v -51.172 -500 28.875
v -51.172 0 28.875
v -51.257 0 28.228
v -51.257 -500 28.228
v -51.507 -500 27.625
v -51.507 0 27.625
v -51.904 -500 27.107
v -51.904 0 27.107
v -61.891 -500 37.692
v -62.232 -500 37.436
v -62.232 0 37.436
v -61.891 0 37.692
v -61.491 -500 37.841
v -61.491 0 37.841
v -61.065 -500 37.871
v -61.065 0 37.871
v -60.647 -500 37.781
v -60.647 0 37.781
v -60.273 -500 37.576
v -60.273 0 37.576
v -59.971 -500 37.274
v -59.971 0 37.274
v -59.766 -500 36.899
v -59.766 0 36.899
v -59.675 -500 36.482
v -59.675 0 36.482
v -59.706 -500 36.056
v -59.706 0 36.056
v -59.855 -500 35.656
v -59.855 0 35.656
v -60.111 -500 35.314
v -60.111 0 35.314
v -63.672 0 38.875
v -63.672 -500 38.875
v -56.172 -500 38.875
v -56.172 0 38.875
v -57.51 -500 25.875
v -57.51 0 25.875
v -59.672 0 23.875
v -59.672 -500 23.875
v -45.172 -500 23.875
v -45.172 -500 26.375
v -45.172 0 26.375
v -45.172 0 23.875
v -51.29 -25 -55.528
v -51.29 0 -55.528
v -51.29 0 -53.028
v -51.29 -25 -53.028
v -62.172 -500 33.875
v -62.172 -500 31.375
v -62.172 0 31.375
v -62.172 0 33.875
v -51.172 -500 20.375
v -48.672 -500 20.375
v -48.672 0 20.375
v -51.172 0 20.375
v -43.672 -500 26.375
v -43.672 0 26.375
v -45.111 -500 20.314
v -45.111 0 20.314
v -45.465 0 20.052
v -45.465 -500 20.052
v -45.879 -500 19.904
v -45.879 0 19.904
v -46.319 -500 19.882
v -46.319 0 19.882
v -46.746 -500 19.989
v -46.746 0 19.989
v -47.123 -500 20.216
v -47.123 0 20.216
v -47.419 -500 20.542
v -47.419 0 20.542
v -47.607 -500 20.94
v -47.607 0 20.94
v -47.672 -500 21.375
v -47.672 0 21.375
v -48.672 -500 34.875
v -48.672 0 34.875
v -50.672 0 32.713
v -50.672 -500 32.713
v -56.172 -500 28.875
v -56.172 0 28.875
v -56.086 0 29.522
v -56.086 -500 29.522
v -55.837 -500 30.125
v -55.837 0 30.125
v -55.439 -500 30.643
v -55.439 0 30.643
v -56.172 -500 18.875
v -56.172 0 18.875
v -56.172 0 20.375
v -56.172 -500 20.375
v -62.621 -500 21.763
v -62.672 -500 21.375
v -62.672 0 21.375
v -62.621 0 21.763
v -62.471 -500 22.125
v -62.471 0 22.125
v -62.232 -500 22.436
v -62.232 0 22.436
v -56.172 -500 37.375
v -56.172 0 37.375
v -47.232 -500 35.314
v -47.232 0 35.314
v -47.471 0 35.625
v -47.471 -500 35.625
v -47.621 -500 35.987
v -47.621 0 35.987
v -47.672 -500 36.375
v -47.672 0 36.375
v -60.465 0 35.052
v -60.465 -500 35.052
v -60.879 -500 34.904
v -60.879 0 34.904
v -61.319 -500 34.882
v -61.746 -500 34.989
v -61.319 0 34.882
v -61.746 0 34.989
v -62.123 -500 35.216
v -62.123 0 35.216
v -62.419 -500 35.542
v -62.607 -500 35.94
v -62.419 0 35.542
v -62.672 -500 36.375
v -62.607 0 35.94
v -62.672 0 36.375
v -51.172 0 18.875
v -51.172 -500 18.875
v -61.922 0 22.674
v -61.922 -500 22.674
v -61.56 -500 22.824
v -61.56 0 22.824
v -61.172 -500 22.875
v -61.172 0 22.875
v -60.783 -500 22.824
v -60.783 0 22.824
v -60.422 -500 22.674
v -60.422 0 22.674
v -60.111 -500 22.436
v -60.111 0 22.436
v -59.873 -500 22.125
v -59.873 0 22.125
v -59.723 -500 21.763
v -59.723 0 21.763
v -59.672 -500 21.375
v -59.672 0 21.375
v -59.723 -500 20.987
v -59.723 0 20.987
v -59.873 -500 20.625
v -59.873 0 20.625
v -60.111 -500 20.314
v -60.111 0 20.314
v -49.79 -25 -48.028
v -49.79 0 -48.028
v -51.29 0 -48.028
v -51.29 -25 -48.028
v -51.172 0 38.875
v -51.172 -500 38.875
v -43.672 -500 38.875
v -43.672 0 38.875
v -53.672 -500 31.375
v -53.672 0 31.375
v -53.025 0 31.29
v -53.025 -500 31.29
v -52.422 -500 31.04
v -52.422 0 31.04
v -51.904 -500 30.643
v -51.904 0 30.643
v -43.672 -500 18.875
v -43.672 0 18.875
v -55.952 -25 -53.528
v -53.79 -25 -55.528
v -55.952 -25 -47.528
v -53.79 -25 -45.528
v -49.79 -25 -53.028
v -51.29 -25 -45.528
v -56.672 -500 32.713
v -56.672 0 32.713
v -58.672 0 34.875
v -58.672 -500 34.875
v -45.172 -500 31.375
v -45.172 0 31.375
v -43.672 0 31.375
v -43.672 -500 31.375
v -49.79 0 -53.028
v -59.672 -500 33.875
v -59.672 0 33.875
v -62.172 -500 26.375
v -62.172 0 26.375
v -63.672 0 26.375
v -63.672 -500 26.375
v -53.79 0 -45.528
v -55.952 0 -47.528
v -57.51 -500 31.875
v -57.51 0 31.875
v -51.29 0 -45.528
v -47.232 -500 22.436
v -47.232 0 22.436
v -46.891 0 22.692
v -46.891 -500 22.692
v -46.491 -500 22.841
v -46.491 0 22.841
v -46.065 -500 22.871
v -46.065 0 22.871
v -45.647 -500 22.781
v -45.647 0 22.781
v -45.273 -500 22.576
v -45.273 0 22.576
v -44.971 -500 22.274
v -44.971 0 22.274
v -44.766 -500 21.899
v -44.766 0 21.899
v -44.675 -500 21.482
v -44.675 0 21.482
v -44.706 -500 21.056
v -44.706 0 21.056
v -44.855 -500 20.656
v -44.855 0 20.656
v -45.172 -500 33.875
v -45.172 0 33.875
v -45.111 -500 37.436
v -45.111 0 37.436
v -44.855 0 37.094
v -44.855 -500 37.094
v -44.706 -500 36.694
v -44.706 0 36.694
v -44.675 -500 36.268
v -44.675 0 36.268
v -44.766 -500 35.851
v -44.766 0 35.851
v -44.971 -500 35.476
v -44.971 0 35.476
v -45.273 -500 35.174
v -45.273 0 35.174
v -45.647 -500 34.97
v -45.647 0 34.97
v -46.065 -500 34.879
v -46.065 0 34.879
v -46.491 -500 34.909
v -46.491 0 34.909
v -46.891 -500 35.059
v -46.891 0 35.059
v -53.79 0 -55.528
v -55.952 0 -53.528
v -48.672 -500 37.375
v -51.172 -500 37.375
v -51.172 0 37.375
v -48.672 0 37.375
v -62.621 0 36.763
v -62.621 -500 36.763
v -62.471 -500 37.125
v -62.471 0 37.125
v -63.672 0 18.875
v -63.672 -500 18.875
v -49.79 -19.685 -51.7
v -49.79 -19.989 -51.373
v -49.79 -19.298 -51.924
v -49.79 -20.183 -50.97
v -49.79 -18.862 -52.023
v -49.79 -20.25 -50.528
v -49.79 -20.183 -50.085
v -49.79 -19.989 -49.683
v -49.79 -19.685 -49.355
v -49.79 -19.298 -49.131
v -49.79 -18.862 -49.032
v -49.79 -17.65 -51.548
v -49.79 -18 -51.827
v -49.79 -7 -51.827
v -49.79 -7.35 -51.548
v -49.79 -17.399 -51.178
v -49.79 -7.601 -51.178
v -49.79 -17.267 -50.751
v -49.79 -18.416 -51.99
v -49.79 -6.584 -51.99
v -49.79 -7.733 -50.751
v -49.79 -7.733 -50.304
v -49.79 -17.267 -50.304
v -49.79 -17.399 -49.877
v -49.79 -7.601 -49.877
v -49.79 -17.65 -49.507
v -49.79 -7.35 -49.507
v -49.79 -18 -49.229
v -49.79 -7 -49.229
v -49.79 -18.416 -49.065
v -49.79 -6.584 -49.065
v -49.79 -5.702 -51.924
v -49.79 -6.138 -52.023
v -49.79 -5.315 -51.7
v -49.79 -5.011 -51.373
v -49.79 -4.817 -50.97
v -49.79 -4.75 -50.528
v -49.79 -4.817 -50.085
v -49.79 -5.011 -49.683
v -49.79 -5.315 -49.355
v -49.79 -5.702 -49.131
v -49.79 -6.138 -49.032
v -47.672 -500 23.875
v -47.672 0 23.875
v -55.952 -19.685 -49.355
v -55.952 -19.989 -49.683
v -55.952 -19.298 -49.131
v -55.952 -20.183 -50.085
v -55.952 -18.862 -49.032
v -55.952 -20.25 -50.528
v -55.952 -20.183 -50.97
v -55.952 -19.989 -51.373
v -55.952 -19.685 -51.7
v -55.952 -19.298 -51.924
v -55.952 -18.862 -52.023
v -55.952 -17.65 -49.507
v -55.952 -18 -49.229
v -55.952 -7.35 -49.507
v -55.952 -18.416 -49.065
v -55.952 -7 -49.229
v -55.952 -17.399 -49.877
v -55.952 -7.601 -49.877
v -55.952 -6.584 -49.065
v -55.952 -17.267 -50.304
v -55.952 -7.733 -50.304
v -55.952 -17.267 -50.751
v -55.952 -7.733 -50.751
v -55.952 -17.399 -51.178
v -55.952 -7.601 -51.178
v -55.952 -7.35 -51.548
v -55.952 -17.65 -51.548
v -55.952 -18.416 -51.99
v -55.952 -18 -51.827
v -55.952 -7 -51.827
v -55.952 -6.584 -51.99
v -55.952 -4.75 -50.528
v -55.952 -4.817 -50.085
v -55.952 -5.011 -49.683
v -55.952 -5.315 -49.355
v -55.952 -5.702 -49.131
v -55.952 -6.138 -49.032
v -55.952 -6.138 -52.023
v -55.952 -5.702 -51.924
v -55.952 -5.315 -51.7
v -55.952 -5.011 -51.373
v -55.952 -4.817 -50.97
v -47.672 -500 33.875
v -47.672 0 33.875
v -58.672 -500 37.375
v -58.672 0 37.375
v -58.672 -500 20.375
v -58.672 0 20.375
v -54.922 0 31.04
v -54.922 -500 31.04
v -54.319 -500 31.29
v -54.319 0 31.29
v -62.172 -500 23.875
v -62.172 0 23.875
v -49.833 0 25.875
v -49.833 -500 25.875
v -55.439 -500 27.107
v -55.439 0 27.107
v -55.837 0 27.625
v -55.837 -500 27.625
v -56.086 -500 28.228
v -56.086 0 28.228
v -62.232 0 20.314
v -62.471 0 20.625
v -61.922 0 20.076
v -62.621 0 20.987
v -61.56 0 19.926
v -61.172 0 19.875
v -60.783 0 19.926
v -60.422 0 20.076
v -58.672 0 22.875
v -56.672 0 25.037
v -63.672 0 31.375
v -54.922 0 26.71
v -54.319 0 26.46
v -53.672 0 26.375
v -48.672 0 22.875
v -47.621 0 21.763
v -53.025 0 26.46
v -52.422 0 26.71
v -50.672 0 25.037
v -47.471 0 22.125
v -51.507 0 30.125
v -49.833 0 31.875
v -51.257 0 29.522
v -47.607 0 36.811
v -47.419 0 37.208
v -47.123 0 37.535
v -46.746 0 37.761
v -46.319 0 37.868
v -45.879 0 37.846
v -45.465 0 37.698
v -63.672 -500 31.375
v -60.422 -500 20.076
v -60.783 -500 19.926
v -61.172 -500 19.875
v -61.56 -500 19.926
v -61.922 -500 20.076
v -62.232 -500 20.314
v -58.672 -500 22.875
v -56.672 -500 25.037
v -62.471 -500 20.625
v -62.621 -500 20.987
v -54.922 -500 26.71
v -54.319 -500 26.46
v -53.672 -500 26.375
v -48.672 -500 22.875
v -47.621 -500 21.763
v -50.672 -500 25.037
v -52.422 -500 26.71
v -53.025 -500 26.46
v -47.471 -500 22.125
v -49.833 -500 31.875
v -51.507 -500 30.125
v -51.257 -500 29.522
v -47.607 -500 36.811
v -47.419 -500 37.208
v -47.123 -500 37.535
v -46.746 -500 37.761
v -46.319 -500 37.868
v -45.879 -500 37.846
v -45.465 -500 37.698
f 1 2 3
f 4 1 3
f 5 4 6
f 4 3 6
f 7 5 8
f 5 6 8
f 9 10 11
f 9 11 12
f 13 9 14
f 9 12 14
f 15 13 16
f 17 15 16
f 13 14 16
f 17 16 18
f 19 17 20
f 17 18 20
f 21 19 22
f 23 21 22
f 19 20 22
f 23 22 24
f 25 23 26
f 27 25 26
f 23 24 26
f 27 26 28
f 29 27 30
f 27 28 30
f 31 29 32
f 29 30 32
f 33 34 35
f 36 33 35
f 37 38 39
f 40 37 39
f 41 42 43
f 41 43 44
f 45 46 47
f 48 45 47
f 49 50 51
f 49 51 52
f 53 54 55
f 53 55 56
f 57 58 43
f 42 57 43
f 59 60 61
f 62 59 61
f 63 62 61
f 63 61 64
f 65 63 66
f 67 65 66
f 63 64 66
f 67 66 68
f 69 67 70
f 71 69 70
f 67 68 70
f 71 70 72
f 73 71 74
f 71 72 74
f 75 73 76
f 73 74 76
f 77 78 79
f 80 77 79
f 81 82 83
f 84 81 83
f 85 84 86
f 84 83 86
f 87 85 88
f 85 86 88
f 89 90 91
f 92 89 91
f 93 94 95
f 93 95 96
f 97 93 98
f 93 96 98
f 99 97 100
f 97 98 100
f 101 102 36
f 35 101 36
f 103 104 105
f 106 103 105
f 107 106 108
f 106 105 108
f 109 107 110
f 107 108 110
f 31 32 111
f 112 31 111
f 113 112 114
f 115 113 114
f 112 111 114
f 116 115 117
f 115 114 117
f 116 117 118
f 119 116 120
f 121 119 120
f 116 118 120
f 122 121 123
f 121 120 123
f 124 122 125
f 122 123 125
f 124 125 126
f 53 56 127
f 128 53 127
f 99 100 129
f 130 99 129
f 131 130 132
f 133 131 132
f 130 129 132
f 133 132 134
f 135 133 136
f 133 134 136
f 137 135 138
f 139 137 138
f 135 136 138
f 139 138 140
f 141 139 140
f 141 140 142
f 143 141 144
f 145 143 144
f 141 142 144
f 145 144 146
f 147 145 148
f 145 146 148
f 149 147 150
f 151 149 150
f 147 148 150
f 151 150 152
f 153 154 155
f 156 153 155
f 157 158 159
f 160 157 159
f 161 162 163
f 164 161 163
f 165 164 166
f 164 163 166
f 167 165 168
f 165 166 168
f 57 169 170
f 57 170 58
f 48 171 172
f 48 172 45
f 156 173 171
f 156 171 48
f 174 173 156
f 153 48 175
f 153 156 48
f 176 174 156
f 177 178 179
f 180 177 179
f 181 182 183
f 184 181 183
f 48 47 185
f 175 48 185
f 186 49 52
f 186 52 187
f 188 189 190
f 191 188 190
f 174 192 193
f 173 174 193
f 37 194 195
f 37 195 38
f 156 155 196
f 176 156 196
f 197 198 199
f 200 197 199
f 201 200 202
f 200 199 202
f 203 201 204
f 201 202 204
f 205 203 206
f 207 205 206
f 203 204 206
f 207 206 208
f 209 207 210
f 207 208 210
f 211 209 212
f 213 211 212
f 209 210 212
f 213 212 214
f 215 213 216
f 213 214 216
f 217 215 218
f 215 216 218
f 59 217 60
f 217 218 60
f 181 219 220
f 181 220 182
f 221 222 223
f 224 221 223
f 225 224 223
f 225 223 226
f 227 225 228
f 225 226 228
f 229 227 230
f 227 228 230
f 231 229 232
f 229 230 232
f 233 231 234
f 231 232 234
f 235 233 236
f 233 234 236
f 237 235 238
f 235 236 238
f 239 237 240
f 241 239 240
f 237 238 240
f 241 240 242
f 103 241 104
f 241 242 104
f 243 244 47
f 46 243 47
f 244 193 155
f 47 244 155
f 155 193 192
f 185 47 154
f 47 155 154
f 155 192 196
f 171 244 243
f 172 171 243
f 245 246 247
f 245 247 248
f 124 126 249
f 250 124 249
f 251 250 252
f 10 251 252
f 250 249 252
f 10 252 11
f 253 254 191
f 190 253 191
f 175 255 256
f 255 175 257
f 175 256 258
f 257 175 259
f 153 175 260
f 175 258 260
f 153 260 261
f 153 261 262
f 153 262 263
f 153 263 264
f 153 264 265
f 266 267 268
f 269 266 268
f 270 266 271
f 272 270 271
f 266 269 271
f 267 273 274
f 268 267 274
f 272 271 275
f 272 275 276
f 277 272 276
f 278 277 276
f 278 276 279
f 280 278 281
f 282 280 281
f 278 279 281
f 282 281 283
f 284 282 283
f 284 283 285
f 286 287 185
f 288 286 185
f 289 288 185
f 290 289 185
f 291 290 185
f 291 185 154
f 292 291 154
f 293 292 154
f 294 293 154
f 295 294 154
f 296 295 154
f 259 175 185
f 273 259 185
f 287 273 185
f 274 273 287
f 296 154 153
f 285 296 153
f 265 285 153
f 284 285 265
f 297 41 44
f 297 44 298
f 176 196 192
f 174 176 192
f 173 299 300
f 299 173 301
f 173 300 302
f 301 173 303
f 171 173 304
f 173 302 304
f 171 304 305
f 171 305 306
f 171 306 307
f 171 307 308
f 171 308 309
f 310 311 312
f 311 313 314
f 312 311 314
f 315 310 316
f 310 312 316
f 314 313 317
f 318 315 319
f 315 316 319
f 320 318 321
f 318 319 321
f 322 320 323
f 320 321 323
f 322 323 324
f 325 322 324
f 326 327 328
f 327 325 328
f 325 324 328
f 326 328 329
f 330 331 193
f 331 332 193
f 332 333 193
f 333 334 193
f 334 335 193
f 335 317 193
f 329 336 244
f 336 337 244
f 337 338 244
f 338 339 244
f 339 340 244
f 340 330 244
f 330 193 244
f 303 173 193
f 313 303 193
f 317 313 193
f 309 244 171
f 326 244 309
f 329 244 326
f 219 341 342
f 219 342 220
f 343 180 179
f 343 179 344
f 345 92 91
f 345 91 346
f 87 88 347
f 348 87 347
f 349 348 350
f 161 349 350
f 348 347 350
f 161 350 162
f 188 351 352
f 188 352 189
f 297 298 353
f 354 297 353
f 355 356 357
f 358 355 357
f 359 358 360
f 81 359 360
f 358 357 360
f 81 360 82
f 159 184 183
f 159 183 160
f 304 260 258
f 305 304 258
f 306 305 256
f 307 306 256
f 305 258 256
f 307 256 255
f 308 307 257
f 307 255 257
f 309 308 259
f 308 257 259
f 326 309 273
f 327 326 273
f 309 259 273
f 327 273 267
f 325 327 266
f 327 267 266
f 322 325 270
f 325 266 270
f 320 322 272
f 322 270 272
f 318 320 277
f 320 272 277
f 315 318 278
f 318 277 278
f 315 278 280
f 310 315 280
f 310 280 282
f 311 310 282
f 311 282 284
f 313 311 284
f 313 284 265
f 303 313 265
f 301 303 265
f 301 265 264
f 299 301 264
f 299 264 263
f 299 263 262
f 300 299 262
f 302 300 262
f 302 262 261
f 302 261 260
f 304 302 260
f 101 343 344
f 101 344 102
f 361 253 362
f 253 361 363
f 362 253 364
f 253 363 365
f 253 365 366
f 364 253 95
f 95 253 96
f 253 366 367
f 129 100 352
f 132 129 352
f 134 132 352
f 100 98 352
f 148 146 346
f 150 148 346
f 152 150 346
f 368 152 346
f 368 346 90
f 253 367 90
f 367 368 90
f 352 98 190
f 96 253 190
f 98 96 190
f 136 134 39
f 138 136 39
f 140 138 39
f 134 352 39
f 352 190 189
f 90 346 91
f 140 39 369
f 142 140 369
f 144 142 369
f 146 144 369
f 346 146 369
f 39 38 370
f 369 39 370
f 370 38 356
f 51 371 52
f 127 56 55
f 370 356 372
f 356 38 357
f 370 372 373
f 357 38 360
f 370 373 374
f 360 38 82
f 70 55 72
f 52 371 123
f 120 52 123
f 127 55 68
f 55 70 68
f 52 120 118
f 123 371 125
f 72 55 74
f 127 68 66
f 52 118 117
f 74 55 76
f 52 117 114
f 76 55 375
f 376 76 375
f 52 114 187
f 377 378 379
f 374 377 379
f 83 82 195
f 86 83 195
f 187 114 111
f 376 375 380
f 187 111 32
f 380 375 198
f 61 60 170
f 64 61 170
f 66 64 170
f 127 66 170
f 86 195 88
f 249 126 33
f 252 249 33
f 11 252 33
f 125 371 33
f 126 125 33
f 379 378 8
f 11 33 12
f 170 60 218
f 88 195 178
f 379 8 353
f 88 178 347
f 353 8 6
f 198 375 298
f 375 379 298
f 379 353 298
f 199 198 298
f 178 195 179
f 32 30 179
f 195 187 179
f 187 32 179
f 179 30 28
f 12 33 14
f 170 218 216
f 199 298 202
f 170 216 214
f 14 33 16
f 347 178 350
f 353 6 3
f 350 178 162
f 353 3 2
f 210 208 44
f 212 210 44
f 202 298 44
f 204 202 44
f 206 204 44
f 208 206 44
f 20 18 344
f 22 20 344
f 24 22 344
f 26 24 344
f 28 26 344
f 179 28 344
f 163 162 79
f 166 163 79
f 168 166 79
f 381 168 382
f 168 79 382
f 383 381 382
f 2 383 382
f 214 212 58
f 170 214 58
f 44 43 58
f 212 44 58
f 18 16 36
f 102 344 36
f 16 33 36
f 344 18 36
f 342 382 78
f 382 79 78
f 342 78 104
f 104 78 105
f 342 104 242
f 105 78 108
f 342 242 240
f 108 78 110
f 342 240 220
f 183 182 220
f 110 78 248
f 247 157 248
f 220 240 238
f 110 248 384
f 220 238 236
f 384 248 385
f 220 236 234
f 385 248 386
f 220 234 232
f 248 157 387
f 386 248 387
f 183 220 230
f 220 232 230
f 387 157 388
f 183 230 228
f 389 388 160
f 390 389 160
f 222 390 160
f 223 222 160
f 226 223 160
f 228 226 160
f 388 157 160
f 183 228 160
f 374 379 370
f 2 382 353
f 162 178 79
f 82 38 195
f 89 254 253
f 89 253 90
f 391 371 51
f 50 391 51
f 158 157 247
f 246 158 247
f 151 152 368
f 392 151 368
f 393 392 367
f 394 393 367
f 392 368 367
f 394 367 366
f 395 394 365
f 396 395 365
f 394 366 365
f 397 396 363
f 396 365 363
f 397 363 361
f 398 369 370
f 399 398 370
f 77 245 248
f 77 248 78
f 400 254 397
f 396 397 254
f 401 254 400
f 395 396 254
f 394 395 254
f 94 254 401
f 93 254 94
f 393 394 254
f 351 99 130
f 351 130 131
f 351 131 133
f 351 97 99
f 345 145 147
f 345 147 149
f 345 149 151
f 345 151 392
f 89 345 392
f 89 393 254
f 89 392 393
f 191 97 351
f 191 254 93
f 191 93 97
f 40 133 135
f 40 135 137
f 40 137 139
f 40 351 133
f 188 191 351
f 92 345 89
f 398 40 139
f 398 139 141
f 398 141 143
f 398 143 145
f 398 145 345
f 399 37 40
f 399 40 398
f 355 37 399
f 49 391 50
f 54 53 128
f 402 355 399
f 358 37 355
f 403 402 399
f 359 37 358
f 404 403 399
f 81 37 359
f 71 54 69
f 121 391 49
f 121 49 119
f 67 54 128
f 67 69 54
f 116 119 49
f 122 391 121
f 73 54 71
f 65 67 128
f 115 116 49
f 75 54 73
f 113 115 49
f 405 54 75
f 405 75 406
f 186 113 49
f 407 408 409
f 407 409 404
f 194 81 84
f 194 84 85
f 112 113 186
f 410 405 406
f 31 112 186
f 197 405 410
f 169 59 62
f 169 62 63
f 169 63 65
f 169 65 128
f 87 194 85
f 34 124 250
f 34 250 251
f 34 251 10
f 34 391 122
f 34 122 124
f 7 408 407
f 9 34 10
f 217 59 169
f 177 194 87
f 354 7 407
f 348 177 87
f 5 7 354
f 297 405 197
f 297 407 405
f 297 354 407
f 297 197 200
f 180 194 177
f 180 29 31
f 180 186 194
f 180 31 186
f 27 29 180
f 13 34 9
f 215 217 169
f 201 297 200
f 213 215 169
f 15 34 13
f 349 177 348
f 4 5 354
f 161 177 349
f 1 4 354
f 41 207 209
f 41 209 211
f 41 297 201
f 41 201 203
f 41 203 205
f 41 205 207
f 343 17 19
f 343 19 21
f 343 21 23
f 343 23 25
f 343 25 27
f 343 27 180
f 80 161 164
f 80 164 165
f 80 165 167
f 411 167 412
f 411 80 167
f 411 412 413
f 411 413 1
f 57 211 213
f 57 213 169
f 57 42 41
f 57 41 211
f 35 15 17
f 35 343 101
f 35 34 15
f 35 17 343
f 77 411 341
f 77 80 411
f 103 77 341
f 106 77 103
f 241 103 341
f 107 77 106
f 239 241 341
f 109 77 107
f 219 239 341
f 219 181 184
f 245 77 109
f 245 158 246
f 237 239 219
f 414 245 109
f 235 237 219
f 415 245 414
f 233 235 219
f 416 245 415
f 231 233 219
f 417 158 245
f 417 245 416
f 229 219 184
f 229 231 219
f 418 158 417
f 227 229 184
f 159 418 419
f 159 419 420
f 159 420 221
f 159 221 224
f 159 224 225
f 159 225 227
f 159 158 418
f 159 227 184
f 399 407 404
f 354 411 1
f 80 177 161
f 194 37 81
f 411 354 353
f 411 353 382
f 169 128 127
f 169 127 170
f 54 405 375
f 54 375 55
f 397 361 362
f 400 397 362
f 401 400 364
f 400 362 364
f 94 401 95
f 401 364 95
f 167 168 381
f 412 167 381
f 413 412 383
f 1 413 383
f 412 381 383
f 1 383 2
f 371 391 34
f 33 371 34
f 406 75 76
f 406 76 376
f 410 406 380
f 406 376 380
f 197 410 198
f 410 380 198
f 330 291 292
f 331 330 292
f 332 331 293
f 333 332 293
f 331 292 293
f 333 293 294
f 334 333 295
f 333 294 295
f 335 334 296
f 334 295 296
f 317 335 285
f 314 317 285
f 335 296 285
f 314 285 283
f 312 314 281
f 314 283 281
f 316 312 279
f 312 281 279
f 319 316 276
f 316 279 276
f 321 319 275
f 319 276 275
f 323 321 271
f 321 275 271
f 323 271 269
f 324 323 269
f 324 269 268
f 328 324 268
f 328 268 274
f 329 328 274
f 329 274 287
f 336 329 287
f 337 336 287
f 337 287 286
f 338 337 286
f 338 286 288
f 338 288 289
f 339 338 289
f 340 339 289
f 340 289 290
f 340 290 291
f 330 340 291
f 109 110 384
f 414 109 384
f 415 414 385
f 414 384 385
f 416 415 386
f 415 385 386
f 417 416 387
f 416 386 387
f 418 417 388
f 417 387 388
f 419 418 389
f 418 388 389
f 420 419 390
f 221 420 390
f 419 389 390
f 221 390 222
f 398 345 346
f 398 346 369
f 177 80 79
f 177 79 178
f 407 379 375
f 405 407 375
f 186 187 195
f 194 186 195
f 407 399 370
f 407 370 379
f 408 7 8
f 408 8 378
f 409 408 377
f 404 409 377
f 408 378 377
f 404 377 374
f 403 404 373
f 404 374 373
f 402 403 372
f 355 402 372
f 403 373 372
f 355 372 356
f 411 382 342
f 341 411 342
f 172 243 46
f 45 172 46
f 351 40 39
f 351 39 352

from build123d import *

# Parameters (mm, degrees)
F0_W     = 20
F0_H     = 20
F1_DEPTH = 500
F3_DEPTH = 500
F5_DEPTH = 25
F7_DEPTH = 25


with BuildPart() as f1:
    # F0 (on Front) → F1 (new body)
    with BuildSketch(Plane.XZ):
        with Locations((-53.6716634035, 28.8750978559)):
            Rectangle(F0_W, F0_H)
    extrude(amount=F1_DEPTH)

    # F2 (on face) → F3 (cut)
    with BuildSketch(Plane(origin=(0, 0, 0), x_dir=(-1, 0, 0), z_dir=(0, 1, 0))):
        Polygon((49.8334686458, 25.8750978559), (49.8334686458, 28.8750978559), (49.8334686458, 31.8750978559), (47.6716634035, 33.8750978559), (45.1716634035, 33.8750978559), (45.1716634035, 31.3750978559), (43.6716634035, 31.3750978559), (43.6716634035, 26.3750978559), (45.1716634035, 26.3750978559), (45.1716634035, 23.8750978559), (47.6716634035, 23.8750978559), align=None)
        Polygon((56.1716634035, 20.3750978559), (58.6716634035, 20.3750978559), (58.6716634035, 22.8750978559), (56.6716634035, 25.0369030982), (53.6716634035, 25.0369030982), (50.6716634035, 25.0369030982), (48.6716634035, 22.8750978559), (48.6716634035, 20.3750978559), (51.1716634035, 20.3750978559), (51.1716634035, 18.8750978559), (56.1716634035, 18.8750978559), align=None)
        Polygon((57.5098581612, 31.8750978559), (57.5098581612, 28.8750978559), (57.5098581612, 25.8750978559), (59.6716634035, 23.8750978559), (62.1716634035, 23.8750978559), (62.1716634035, 26.3750978559), (63.6716634035, 26.3750978559), (63.6716634035, 28.8750978559), (63.6716634035, 31.3750978559), (62.1716634035, 31.3750978559), (62.1716634035, 33.8750978559), (59.6716634035, 33.8750978559), align=None)
        Polygon((50.6716634035, 32.7132926136), (53.6716634035, 32.7132926136), (56.6716634035, 32.7132926136), (58.6716634035, 34.8750978559), (58.6716634035, 37.3750978559), (56.1716634035, 37.3750978559), (56.1716634035, 38.8750978559), (51.1716634035, 38.8750978559), (51.1716634035, 37.3750978559), (48.6716634035, 37.3750978559), (48.6716634035, 34.8750978559), align=None)
        with BuildLine():
            ThreePointArc((62.2323235753, 37.4357580277), (60.1110032317, 37.4357580277), (60.1110032317, 35.3144376841))
            Line((60.1110032317, 35.3144376841), (62.2323235753, 37.4357580277))
        make_face()
        with BuildLine():
            Line((62.2323235753, 37.4357580277), (60.1110032317, 35.3144376841))
            ThreePointArc((60.1110032317, 35.3144376841), (61.7456885521, 34.9892785572), (62.6716634035, 36.3750978559))
            ThreePointArc((62.6716634035, 36.3750978559), (62.5574827023, 36.9491230045), (62.2323235753, 37.4357580277))
        make_face()
        with BuildLine():
            Line((51.1716634035, 28.8750978559), (53.6716634035, 28.8750978559))
            Line((53.6716634035, 28.8750978559), (51.9038964505, 30.6428648089))
            ThreePointArc((51.9038964505, 30.6428648089), (51.3619645722, 29.8318064368), (51.1716634035, 28.8750978559))
        make_face()
        with BuildLine():
            Line((51.9038964505, 27.107330903), (53.6716634035, 28.8750978559))
            Line((53.6716634035, 28.8750978559), (51.1716634035, 28.8750978559))
            ThreePointArc((51.1716634035, 28.8750978559), (51.3619645722, 27.918389275), (51.9038964505, 27.107330903))
        make_face()
        with BuildLine():
            Line((55.4394303565, 27.107330903), (53.6716634035, 28.8750978559))
            Line((53.6716634035, 28.8750978559), (51.9038964505, 27.107330903))
            ThreePointArc((51.9038964505, 27.107330903), (53.6716634035, 26.3750978559), (55.4394303565, 27.107330903))
        make_face()
        with BuildLine():
            Line((56.1716634035, 28.8750978559), (53.6716634035, 28.8750978559))
            Line((53.6716634035, 28.8750978559), (55.4394303565, 27.107330903))
            ThreePointArc((55.4394303565, 27.107330903), (55.9813622348, 27.918389275), (56.1716634035, 28.8750978559))
        make_face()
        with BuildLine():
            Line((55.4394303565, 30.6428648089), (53.6716634035, 28.8750978559))
            Line((53.6716634035, 28.8750978559), (56.1716634035, 28.8750978559))
            ThreePointArc((56.1716634035, 28.8750978559), (55.9813622348, 29.8318064368), (55.4394303565, 30.6428648089))
        make_face()
        with BuildLine():
            ThreePointArc((55.4394303565, 30.6428648089), (54.6283719844, 31.1847966872), (53.6716634035, 31.3750978559))
            Line((53.6716634035, 31.3750978559), (53.6716634035, 28.8750978559))
            Line((53.6716634035, 28.8750978559), (55.4394303565, 30.6428648089))
        make_face()
        with BuildLine():
            Line((53.6716634035, 28.8750978559), (53.6716634035, 31.3750978559))
            ThreePointArc((53.6716634035, 31.3750978559), (52.7149548226, 31.1847966872), (51.9038964505, 30.6428648089))
            Line((51.9038964505, 30.6428648089), (53.6716634035, 28.8750978559))
        make_face()
        with BuildLine():
            Line((45.1110032317, 20.3144376841), (47.2323235753, 22.4357580277))
            ThreePointArc((47.2323235753, 22.4357580277), (45.1110032317, 22.4357580277), (45.1110032317, 20.3144376841))
        make_face()
        with BuildLine():
            ThreePointArc((47.6716634035, 21.3750978559), (47.5574827023, 21.9491230045), (47.2323235753, 22.4357580277))
            Line((47.2323235753, 22.4357580277), (45.1110032317, 20.3144376841))
            ThreePointArc((45.1110032317, 20.3144376841), (46.7456885521, 19.9892785572), (47.6716634035, 21.3750978559))
        make_face()
        with BuildLine():
            Line((61.1716634035, 21.3750978559), (60.1110032317, 22.4357580277))
            ThreePointArc((60.1110032317, 22.4357580277), (59.6716634035, 21.3750978559), (60.1110032317, 20.3144376841))
            Line((60.1110032317, 20.3144376841), (61.1716634035, 21.3750978559))
        make_face()
        with BuildLine():
            Line((62.2323235753, 20.3144376841), (61.1716634035, 21.3750978559))
            Line((61.1716634035, 21.3750978559), (60.1110032317, 20.3144376841))
            ThreePointArc((60.1110032317, 20.3144376841), (61.1716634035, 19.8750978559), (62.2323235753, 20.3144376841))
        make_face()
        with BuildLine():
            Line((62.2323235753, 22.4357580277), (61.1716634035, 21.3750978559))
            Line((61.1716634035, 21.3750978559), (62.2323235753, 20.3144376841))
            ThreePointArc((62.2323235753, 20.3144376841), (62.5574827023, 20.8010727074), (62.6716634035, 21.3750978559))
            ThreePointArc((62.6716634035, 21.3750978559), (62.5574827023, 21.9491230045), (62.2323235753, 22.4357580277))
        make_face()
        with BuildLine():
            ThreePointArc((62.2323235753, 22.4357580277), (61.1716634035, 22.8750978559), (60.1110032317, 22.4357580277))
            Line((60.1110032317, 22.4357580277), (61.1716634035, 21.3750978559))
            Line((61.1716634035, 21.3750978559), (62.2323235753, 22.4357580277))
        make_face()
        with BuildLine():
            ThreePointArc((45.1110032317, 37.4357580277), (45.1110032317, 35.3144376841), (47.2323235753, 35.3144376841))
            Line((47.2323235753, 35.3144376841), (45.1110032317, 37.4357580277))
        make_face()
        with BuildLine():
            Line((45.1110032317, 37.4357580277), (47.2323235753, 35.3144376841))
            ThreePointArc((47.2323235753, 35.3144376841), (47.5574827023, 35.8010727074), (47.6716634035, 36.3750978559))
            ThreePointArc((47.6716634035, 36.3750978559), (46.7456885521, 37.7609171547), (45.1110032317, 37.4357580277))
        make_face()
    extrude(amount=-F3_DEPTH, mode=Mode.SUBTRACT)


with BuildPart() as f5:
    # F4 (on Front) → F5 (new body)
    with BuildSketch(Plane.XZ):
        Polygon((-51.2904248573, -53.027571466), (-49.7904248573, -53.027571466), (-49.7904248573, -50.527571466), (-49.7904248573, -48.027571466), (-51.2904248573, -48.027571466), (-51.2904248573, -45.527571466), (-53.7904248573, -45.527571466), (-55.9521429241, -47.527571466), (-55.9521429241, -50.527571466), (-55.9521429241, -53.527571466), (-53.7904248573, -55.527571466), (-51.2904248573, -55.527571466), align=None)
    extrude(amount=F5_DEPTH)

    # F6 (on face) → F7 (cut)
    with BuildSketch(Plane.YZ.offset(-49.7904248573)):
        with BuildLine():
            Line((-20.25, -50.527571466), (-18.75, -50.527571466))
            Line((-18.75, -50.527571466), (-17.25, -50.527571466))
            ThreePointArc((-17.25, -50.527571466), (-18.75, -49.027571466), (-20.25, -50.527571466))
        make_face()
        with BuildLine():
            Line((-17.25, -50.527571466), (-18.75, -50.527571466))
            Line((-18.75, -50.527571466), (-20.25, -50.527571466))
            ThreePointArc((-20.25, -50.527571466), (-18.75, -52.027571466), (-17.25, -50.527571466))
        make_face()
        with BuildLine():
            Line((-6.25, -50.527571466), (-7.75, -50.527571466))
            ThreePointArc((-7.75, -50.527571466), (-6.25, -52.027571466), (-4.75, -50.527571466))
            Line((-4.75, -50.527571466), (-6.25, -50.527571466))
        make_face()
        with BuildLine():
            ThreePointArc((-4.75, -50.527571466), (-6.25, -49.027571466), (-7.75, -50.527571466))
            Line((-7.75, -50.527571466), (-6.25, -50.527571466))
            Line((-6.25, -50.527571466), (-4.75, -50.527571466))
        make_face()
    extrude(amount=-F7_DEPTH, mode=Mode.SUBTRACT)


solid = Compound([f1.part, f5.part])
